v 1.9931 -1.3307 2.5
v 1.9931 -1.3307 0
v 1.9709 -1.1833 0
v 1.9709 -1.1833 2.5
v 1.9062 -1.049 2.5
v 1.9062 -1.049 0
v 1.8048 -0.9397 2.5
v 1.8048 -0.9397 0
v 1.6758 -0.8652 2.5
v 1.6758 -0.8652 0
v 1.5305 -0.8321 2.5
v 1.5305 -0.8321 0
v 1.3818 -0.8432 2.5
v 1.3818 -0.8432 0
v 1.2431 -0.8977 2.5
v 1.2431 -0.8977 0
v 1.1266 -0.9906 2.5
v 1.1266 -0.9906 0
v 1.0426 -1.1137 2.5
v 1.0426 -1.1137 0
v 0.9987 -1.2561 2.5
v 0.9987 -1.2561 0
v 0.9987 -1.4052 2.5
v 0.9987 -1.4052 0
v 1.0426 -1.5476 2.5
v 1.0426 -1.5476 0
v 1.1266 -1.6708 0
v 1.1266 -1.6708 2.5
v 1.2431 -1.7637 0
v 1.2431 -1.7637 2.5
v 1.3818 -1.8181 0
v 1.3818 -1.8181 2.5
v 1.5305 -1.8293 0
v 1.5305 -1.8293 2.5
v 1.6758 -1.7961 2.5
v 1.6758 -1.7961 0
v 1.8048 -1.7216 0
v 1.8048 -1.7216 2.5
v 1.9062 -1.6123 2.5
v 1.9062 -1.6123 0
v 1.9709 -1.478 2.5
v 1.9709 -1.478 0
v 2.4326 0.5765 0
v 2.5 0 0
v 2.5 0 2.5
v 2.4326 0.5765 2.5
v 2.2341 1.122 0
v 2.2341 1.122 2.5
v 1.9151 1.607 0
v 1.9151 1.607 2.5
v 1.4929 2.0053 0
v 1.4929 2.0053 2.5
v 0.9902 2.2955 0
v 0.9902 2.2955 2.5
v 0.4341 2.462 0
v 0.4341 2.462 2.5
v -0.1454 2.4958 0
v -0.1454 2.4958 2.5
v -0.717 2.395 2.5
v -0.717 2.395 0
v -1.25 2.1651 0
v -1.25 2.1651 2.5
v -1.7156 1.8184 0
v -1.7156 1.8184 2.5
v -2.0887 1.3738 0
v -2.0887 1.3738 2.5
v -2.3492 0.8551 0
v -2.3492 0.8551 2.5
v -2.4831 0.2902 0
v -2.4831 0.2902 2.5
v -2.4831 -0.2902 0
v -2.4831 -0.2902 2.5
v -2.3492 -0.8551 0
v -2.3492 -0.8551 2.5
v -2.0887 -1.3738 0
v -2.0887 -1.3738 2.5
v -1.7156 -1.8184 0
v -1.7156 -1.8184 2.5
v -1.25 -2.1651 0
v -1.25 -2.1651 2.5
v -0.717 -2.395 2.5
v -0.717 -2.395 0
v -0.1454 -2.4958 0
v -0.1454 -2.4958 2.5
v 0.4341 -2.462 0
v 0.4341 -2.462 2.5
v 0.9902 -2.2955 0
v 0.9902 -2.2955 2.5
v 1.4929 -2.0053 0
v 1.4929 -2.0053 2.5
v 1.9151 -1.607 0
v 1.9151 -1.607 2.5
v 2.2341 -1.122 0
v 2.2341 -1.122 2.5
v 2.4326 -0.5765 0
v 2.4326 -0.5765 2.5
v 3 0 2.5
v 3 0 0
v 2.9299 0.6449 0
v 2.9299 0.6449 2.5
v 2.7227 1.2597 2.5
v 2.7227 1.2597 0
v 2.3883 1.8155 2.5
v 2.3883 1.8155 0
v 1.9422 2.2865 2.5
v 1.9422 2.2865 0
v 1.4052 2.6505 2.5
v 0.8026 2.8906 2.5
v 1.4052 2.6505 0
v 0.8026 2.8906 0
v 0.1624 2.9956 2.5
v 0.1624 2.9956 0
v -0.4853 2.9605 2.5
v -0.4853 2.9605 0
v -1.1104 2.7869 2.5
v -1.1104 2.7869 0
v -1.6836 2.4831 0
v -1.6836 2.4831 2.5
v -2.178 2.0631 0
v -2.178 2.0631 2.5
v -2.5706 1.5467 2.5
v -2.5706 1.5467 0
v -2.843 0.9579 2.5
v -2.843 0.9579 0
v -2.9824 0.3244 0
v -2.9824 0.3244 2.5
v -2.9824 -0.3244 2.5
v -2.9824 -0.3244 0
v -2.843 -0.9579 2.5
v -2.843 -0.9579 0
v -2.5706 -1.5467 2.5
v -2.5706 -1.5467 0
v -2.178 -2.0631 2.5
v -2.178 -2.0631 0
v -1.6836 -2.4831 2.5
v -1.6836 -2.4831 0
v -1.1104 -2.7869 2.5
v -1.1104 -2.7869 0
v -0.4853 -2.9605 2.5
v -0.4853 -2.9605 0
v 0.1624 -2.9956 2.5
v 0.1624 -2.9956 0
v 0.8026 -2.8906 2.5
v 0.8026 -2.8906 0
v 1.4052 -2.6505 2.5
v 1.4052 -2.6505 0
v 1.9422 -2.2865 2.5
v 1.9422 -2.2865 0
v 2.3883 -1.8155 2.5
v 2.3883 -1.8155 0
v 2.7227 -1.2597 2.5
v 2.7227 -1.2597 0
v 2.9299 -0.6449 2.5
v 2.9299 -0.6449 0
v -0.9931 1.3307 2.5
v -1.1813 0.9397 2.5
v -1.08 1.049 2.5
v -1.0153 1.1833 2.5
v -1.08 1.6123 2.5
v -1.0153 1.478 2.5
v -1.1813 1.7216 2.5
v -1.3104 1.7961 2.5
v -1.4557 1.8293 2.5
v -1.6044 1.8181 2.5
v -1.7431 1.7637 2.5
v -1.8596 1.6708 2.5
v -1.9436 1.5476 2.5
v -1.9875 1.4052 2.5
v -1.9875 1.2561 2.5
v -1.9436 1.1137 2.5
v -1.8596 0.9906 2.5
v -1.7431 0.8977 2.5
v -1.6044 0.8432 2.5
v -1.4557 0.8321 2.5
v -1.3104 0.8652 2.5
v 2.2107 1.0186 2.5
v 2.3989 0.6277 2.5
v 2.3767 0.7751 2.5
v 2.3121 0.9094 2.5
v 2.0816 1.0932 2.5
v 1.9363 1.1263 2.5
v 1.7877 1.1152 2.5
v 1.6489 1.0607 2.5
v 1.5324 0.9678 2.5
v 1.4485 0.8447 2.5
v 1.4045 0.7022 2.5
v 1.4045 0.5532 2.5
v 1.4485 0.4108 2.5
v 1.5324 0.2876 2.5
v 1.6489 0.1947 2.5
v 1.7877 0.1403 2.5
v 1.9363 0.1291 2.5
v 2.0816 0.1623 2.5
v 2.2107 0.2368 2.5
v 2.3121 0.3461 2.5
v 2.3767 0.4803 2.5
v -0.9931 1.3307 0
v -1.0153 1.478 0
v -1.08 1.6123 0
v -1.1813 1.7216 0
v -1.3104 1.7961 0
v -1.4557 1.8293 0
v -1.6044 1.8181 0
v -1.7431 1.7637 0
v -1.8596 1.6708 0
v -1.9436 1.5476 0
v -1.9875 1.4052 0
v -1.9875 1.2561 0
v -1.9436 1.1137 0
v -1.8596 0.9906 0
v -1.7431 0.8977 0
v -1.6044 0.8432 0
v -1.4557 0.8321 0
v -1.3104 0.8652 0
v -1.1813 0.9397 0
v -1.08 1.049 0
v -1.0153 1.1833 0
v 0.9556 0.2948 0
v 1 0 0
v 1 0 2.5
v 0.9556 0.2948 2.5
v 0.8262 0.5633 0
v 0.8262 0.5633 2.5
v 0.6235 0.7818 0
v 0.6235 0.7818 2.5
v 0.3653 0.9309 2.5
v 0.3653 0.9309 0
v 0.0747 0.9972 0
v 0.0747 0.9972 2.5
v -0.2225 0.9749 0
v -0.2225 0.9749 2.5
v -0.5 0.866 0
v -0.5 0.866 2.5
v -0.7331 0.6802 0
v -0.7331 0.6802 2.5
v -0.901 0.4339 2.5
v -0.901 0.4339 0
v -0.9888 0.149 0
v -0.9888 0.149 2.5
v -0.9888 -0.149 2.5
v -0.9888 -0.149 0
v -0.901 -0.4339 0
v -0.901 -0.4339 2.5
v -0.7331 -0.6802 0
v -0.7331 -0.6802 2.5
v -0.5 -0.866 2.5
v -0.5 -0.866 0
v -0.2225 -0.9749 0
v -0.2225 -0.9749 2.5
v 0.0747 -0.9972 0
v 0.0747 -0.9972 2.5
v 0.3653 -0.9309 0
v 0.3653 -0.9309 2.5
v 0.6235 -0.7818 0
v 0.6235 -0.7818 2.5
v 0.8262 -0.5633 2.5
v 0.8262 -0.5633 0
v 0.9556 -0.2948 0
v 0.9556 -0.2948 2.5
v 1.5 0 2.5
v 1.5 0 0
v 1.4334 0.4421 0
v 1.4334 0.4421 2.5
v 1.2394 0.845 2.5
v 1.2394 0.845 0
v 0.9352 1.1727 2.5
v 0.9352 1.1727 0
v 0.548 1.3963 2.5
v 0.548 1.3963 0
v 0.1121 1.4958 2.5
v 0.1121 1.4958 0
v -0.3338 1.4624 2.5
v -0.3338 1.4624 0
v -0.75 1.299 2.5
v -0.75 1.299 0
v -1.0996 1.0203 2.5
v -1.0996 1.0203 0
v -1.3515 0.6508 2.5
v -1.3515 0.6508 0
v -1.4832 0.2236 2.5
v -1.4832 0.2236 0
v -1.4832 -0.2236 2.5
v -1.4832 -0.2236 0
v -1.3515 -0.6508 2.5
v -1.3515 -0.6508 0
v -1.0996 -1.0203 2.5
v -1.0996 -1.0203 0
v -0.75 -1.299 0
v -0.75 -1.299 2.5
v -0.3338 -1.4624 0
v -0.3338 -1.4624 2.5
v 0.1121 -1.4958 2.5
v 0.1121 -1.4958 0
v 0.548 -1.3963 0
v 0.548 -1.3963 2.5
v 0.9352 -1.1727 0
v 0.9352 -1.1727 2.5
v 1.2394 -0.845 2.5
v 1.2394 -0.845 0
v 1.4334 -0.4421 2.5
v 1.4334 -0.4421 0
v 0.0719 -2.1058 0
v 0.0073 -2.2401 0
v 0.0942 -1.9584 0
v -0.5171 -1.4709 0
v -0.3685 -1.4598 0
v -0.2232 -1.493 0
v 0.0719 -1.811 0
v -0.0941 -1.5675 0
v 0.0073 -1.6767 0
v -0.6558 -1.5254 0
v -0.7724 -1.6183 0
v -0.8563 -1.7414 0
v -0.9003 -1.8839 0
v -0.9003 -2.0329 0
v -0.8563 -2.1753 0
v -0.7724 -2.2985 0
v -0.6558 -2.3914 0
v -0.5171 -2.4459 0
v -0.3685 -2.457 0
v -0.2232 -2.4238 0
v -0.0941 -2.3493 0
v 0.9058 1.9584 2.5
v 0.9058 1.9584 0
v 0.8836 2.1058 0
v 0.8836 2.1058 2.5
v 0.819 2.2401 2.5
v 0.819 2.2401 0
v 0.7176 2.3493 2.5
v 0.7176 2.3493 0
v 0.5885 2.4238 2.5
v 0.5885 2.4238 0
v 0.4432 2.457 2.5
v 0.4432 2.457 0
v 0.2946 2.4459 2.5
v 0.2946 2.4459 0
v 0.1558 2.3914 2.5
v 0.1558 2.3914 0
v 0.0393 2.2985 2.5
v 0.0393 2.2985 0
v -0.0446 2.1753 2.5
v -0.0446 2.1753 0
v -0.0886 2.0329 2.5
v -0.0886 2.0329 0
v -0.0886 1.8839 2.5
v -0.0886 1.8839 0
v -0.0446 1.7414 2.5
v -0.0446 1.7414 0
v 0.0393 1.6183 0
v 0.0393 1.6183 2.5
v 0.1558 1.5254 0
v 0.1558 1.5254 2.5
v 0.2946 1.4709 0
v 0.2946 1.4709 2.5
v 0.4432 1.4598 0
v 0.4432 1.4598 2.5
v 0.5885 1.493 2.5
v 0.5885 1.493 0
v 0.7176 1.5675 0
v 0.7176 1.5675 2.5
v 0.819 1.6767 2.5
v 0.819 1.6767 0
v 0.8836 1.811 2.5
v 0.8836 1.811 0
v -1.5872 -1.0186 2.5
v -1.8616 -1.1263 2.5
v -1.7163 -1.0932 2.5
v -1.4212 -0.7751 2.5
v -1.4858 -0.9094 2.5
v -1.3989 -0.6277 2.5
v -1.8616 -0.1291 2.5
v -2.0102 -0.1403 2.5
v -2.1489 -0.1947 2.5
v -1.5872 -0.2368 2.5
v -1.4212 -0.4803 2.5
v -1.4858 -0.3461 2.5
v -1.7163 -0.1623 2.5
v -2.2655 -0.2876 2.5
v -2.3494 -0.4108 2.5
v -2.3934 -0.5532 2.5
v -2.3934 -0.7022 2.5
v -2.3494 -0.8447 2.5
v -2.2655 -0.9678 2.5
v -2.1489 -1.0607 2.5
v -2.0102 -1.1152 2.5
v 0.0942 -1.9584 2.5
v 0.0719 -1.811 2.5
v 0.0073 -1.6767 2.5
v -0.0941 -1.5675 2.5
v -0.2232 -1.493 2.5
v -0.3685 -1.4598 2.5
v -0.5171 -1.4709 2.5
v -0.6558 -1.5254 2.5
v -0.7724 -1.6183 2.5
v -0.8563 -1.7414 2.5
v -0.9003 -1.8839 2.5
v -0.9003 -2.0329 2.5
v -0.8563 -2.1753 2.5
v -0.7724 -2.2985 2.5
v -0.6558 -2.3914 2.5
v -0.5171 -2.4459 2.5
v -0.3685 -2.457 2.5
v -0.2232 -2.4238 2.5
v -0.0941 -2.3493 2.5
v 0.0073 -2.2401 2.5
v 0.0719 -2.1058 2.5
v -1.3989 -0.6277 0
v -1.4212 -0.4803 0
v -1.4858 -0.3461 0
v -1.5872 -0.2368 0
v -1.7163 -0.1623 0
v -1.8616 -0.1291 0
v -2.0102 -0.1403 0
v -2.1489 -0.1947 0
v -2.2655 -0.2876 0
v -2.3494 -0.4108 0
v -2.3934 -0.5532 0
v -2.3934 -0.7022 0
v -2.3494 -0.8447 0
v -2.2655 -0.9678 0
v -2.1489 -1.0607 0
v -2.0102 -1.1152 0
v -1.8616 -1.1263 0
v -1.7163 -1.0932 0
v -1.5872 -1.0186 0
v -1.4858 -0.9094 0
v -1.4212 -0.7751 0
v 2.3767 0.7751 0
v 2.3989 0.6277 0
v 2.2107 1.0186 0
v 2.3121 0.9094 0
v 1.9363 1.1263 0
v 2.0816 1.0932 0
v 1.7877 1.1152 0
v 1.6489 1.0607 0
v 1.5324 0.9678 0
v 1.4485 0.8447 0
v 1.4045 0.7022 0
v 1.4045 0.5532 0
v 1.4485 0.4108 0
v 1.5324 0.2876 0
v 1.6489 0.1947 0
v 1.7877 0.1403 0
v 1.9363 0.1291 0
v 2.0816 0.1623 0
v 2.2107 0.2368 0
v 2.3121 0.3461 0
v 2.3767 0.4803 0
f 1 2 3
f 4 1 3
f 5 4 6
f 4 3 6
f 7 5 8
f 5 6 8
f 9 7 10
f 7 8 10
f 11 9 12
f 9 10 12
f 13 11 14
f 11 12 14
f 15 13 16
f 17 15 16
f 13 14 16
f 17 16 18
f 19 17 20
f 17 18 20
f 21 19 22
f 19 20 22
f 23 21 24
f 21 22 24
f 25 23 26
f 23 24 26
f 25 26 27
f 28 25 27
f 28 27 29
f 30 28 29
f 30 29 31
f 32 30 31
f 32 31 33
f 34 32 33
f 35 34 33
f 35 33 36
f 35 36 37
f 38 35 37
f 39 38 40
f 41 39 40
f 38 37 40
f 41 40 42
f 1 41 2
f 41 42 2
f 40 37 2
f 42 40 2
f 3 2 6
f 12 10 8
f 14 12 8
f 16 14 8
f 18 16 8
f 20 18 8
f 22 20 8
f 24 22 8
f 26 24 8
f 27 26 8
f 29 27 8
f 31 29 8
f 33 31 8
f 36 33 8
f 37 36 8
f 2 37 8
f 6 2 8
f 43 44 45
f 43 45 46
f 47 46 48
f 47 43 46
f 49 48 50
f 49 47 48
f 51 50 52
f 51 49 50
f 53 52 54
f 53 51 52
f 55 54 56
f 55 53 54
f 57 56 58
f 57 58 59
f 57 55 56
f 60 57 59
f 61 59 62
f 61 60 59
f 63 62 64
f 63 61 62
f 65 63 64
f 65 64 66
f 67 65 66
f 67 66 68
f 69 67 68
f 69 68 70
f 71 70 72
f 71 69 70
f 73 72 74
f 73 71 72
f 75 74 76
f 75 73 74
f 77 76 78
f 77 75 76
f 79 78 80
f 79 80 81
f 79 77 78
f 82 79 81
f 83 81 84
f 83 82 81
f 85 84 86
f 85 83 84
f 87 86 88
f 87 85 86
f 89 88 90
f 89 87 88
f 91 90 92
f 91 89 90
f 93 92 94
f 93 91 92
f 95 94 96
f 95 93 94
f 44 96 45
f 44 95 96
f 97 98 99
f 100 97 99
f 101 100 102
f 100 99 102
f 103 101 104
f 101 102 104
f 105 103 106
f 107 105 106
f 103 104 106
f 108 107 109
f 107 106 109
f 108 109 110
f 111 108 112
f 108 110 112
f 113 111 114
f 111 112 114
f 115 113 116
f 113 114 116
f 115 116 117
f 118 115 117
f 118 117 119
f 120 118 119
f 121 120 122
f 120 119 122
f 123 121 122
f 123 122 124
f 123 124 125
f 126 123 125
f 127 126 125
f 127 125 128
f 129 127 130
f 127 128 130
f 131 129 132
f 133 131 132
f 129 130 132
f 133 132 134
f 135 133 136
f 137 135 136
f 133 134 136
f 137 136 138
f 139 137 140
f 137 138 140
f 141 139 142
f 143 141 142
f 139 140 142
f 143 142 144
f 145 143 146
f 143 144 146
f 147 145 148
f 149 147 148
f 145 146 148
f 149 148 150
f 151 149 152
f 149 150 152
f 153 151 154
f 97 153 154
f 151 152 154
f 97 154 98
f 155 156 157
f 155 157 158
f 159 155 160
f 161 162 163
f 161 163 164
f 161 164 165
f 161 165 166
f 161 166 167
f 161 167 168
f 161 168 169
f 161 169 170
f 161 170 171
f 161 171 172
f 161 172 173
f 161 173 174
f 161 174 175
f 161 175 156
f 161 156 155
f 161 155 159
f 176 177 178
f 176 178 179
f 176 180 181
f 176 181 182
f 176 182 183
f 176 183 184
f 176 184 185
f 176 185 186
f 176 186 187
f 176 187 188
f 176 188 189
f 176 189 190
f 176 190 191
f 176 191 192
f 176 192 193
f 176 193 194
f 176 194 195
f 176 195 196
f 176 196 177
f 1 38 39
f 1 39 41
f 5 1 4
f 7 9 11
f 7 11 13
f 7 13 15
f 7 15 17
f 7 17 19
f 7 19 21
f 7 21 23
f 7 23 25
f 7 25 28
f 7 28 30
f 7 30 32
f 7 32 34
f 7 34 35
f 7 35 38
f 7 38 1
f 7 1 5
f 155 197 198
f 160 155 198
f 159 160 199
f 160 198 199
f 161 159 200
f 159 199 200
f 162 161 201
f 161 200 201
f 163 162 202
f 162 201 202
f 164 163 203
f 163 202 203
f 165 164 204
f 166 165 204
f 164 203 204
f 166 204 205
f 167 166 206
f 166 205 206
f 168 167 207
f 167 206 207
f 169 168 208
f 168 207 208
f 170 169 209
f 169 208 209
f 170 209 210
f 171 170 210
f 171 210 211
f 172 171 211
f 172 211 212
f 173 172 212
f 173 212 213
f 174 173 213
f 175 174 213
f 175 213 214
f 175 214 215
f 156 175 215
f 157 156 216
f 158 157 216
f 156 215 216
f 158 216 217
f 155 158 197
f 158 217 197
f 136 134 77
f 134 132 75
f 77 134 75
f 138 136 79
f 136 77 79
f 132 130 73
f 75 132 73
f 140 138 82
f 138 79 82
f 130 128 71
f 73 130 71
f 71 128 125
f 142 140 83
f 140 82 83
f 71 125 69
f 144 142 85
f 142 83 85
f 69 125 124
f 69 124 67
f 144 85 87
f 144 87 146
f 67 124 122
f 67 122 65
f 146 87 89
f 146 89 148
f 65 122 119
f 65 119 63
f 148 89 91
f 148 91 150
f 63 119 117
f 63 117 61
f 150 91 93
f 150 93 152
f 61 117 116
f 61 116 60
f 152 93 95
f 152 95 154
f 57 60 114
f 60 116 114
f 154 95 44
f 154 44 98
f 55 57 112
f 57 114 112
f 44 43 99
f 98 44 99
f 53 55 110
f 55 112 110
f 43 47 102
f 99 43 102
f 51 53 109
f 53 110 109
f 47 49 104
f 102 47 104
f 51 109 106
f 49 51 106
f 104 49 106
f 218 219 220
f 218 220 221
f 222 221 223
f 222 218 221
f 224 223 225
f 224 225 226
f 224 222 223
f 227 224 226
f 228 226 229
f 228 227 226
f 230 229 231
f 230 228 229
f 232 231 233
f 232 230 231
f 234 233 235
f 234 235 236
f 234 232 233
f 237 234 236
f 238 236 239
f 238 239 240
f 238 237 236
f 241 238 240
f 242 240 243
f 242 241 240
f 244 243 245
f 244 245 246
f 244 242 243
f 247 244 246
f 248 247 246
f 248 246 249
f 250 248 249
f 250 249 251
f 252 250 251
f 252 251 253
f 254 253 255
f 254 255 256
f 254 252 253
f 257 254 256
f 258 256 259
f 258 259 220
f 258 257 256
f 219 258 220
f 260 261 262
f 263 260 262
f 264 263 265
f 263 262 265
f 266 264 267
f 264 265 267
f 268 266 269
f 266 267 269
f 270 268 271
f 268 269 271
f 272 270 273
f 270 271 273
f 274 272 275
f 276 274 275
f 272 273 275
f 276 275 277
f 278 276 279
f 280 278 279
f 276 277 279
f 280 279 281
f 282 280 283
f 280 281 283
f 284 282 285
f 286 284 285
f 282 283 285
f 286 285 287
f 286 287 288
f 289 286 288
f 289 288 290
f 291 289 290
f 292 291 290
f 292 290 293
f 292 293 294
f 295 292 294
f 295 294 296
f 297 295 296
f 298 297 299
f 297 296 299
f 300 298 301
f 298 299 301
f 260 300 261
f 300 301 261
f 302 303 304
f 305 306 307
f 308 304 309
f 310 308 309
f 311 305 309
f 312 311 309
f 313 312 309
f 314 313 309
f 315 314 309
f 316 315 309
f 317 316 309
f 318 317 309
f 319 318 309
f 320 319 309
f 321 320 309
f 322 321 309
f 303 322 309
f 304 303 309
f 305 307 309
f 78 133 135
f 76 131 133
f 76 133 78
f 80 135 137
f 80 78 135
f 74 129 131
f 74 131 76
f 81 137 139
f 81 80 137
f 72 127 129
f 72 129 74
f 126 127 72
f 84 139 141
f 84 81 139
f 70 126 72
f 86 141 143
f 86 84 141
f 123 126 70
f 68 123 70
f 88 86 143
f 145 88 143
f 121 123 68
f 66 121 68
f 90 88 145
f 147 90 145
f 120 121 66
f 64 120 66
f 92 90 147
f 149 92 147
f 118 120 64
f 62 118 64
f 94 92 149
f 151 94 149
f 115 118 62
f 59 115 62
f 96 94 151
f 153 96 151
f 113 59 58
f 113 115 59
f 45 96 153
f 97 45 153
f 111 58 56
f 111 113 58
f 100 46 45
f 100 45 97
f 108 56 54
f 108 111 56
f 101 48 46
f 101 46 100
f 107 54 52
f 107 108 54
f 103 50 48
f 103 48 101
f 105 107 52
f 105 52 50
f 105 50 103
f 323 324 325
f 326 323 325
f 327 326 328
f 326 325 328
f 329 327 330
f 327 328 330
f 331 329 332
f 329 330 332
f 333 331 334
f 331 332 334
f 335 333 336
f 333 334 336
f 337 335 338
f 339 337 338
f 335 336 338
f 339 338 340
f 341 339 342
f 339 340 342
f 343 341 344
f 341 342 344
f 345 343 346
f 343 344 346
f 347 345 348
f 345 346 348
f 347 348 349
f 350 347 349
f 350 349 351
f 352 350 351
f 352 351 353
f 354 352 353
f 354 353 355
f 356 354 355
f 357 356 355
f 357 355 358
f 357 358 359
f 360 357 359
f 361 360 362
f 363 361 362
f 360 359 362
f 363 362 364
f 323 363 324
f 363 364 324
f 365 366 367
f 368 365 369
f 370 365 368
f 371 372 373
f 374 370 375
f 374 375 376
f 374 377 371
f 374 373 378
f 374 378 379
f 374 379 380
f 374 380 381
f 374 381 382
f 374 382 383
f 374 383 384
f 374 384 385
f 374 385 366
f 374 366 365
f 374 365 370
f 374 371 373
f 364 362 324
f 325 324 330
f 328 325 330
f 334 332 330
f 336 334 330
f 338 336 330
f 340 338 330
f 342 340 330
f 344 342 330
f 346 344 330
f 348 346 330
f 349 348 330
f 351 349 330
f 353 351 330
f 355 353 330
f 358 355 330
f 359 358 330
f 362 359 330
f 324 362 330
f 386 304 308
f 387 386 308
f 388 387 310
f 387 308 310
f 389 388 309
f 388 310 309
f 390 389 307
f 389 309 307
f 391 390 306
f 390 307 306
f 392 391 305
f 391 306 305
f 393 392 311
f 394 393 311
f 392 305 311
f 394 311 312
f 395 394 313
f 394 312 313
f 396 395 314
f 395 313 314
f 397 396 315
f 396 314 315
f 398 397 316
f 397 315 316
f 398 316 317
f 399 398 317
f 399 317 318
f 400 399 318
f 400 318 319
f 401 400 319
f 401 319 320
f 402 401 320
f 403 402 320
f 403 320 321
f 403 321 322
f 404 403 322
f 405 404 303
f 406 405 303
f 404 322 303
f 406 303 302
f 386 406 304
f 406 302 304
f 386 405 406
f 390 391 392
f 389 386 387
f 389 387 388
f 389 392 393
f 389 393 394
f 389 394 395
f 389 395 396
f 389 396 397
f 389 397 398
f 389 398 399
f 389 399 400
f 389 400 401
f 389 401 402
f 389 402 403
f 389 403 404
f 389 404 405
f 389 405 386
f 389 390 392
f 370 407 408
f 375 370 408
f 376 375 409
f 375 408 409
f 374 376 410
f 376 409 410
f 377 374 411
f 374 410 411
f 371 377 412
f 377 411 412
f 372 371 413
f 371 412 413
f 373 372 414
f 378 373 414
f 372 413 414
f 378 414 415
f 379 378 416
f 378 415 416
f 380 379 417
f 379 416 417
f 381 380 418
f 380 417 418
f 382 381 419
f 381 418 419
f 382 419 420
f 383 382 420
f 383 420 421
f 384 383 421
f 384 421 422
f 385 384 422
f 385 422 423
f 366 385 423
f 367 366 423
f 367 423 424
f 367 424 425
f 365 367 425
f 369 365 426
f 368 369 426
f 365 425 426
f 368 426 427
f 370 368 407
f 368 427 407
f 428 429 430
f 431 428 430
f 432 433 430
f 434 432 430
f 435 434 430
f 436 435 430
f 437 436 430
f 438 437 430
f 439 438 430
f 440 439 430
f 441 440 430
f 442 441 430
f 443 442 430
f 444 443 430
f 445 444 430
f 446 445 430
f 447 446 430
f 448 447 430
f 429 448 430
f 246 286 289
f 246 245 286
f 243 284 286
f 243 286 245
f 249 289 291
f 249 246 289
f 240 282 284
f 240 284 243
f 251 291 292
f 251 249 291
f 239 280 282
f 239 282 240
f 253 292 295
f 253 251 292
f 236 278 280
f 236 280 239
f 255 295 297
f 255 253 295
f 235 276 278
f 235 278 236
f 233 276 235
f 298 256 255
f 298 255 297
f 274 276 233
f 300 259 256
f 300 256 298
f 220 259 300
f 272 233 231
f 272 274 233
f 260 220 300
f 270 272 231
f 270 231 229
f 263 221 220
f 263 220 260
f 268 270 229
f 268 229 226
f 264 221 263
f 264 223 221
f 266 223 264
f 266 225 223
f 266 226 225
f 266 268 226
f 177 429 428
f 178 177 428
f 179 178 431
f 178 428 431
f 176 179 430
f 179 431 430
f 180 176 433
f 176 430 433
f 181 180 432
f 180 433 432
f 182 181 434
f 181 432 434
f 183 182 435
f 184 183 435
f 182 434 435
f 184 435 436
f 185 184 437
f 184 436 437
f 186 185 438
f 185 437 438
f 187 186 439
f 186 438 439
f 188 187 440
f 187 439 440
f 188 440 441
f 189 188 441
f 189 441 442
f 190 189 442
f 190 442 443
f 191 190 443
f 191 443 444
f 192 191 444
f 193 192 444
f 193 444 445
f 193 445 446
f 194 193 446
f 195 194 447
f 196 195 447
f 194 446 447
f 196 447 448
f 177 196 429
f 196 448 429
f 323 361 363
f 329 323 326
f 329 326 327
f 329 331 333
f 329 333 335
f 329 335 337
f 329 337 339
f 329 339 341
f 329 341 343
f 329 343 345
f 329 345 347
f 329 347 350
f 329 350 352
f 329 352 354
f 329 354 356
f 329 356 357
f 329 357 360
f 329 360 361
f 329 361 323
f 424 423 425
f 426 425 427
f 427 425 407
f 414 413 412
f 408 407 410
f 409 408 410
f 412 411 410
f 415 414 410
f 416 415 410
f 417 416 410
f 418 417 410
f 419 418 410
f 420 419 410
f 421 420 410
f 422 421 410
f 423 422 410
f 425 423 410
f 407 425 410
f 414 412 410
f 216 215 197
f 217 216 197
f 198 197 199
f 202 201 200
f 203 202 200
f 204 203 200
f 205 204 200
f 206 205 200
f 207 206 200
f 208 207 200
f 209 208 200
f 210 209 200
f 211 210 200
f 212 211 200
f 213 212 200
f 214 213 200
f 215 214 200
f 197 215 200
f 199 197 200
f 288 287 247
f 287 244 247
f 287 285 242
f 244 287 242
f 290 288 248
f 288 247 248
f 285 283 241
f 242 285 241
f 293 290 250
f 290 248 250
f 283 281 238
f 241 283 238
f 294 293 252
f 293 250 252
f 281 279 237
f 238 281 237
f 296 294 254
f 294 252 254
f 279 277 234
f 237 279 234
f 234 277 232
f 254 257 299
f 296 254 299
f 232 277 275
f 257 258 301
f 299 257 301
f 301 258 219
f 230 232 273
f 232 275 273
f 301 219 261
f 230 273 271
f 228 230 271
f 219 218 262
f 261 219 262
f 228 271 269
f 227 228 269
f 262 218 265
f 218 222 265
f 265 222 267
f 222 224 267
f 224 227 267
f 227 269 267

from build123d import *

# Parameters (mm, degrees)
SKETCH_1_R        = 3
SKETCH_1_R_2      = 2.5
EXTRUDE_1_DEPTH   = 2.5
SKETCH_1_R_3      = 1.5
SKETCH_1_R_4      = 1
EXTRUDE_1_2_DEPTH = 2.5
SKETCH_2_R        = 0.5
EXTRUDE_2_DEPTH   = 2.5
EXTRUDE_2_2_DEPTH = 2.5
EXTRUDE_2_3_DEPTH = 2.5
EXTRUDE_2_4_DEPTH = 2.5
EXTRUDE_2_5_DEPTH = 2.5
EXTRUDE_2_6_DEPTH = 2.5


with BuildPart() as part:
    # 草图1 → 凸台-拉伸1 (new body)
    with BuildSketch(Plane.XY):
        Circle(SKETCH_1_R)
        Circle(SKETCH_1_R_2, mode=Mode.SUBTRACT)
    extrude(amount=EXTRUDE_1_DEPTH)


with BuildPart() as body_2:
    # 草图1 → Extrude 1 2 (new body)
    with BuildSketch(Plane.XY):
        Circle(SKETCH_1_R_3)
        Circle(SKETCH_1_R_4, mode=Mode.SUBTRACT)
    extrude(amount=EXTRUDE_1_2_DEPTH)


with BuildPart() as body_3:
    # 草图2 → 凸台-拉伸2 (new body)
    with BuildSketch(Plane.XY):
        with Locations((-1.493093999, 1.330665363)):
            Circle(SKETCH_2_R)
    extrude(amount=EXTRUDE_2_DEPTH)


with BuildPart() as body_4:
    # 草图2 → Extrude 2 2 (new body)
    with BuildSketch(Plane.XY):
        with Locations((0.405843009, 1.958390015)):
            Circle(SKETCH_2_R)
    extrude(amount=EXTRUDE_2_2_DEPTH)


with BuildPart() as body_5:
    # 草图2 → Extrude 2 3 (new body)
    with BuildSketch(Plane.XY):
        with Locations((1.898937008, 0.627724652)):
            Circle(SKETCH_2_R)
    extrude(amount=EXTRUDE_2_3_DEPTH)


with BuildPart() as body_6:
    # 草图2 → Extrude 2 4 (new body)
    with BuildSketch(Plane.XY):
        with Locations((1.493093999, -1.330665363)):
            Circle(SKETCH_2_R)
    extrude(amount=EXTRUDE_2_4_DEPTH)


with BuildPart() as body_7:
    # 草图2 → Extrude 2 5 (new body)
    with BuildSketch(Plane.XY):
        with Locations((-0.405843009, -1.958390015)):
            Circle(SKETCH_2_R)
    extrude(amount=EXTRUDE_2_5_DEPTH)


with BuildPart() as body_8:
    # 草图2 → Extrude 2 6 (new body)
    with BuildSketch(Plane.XY):
        with Locations((-1.898937008, -0.627724652)):
            Circle(SKETCH_2_R)
    extrude(amount=EXTRUDE_2_6_DEPTH)


solid = Compound([part.part, body_2.part, body_3.part, body_4.part, body_5.part, body_6.part, body_7.part, body_8.part])
